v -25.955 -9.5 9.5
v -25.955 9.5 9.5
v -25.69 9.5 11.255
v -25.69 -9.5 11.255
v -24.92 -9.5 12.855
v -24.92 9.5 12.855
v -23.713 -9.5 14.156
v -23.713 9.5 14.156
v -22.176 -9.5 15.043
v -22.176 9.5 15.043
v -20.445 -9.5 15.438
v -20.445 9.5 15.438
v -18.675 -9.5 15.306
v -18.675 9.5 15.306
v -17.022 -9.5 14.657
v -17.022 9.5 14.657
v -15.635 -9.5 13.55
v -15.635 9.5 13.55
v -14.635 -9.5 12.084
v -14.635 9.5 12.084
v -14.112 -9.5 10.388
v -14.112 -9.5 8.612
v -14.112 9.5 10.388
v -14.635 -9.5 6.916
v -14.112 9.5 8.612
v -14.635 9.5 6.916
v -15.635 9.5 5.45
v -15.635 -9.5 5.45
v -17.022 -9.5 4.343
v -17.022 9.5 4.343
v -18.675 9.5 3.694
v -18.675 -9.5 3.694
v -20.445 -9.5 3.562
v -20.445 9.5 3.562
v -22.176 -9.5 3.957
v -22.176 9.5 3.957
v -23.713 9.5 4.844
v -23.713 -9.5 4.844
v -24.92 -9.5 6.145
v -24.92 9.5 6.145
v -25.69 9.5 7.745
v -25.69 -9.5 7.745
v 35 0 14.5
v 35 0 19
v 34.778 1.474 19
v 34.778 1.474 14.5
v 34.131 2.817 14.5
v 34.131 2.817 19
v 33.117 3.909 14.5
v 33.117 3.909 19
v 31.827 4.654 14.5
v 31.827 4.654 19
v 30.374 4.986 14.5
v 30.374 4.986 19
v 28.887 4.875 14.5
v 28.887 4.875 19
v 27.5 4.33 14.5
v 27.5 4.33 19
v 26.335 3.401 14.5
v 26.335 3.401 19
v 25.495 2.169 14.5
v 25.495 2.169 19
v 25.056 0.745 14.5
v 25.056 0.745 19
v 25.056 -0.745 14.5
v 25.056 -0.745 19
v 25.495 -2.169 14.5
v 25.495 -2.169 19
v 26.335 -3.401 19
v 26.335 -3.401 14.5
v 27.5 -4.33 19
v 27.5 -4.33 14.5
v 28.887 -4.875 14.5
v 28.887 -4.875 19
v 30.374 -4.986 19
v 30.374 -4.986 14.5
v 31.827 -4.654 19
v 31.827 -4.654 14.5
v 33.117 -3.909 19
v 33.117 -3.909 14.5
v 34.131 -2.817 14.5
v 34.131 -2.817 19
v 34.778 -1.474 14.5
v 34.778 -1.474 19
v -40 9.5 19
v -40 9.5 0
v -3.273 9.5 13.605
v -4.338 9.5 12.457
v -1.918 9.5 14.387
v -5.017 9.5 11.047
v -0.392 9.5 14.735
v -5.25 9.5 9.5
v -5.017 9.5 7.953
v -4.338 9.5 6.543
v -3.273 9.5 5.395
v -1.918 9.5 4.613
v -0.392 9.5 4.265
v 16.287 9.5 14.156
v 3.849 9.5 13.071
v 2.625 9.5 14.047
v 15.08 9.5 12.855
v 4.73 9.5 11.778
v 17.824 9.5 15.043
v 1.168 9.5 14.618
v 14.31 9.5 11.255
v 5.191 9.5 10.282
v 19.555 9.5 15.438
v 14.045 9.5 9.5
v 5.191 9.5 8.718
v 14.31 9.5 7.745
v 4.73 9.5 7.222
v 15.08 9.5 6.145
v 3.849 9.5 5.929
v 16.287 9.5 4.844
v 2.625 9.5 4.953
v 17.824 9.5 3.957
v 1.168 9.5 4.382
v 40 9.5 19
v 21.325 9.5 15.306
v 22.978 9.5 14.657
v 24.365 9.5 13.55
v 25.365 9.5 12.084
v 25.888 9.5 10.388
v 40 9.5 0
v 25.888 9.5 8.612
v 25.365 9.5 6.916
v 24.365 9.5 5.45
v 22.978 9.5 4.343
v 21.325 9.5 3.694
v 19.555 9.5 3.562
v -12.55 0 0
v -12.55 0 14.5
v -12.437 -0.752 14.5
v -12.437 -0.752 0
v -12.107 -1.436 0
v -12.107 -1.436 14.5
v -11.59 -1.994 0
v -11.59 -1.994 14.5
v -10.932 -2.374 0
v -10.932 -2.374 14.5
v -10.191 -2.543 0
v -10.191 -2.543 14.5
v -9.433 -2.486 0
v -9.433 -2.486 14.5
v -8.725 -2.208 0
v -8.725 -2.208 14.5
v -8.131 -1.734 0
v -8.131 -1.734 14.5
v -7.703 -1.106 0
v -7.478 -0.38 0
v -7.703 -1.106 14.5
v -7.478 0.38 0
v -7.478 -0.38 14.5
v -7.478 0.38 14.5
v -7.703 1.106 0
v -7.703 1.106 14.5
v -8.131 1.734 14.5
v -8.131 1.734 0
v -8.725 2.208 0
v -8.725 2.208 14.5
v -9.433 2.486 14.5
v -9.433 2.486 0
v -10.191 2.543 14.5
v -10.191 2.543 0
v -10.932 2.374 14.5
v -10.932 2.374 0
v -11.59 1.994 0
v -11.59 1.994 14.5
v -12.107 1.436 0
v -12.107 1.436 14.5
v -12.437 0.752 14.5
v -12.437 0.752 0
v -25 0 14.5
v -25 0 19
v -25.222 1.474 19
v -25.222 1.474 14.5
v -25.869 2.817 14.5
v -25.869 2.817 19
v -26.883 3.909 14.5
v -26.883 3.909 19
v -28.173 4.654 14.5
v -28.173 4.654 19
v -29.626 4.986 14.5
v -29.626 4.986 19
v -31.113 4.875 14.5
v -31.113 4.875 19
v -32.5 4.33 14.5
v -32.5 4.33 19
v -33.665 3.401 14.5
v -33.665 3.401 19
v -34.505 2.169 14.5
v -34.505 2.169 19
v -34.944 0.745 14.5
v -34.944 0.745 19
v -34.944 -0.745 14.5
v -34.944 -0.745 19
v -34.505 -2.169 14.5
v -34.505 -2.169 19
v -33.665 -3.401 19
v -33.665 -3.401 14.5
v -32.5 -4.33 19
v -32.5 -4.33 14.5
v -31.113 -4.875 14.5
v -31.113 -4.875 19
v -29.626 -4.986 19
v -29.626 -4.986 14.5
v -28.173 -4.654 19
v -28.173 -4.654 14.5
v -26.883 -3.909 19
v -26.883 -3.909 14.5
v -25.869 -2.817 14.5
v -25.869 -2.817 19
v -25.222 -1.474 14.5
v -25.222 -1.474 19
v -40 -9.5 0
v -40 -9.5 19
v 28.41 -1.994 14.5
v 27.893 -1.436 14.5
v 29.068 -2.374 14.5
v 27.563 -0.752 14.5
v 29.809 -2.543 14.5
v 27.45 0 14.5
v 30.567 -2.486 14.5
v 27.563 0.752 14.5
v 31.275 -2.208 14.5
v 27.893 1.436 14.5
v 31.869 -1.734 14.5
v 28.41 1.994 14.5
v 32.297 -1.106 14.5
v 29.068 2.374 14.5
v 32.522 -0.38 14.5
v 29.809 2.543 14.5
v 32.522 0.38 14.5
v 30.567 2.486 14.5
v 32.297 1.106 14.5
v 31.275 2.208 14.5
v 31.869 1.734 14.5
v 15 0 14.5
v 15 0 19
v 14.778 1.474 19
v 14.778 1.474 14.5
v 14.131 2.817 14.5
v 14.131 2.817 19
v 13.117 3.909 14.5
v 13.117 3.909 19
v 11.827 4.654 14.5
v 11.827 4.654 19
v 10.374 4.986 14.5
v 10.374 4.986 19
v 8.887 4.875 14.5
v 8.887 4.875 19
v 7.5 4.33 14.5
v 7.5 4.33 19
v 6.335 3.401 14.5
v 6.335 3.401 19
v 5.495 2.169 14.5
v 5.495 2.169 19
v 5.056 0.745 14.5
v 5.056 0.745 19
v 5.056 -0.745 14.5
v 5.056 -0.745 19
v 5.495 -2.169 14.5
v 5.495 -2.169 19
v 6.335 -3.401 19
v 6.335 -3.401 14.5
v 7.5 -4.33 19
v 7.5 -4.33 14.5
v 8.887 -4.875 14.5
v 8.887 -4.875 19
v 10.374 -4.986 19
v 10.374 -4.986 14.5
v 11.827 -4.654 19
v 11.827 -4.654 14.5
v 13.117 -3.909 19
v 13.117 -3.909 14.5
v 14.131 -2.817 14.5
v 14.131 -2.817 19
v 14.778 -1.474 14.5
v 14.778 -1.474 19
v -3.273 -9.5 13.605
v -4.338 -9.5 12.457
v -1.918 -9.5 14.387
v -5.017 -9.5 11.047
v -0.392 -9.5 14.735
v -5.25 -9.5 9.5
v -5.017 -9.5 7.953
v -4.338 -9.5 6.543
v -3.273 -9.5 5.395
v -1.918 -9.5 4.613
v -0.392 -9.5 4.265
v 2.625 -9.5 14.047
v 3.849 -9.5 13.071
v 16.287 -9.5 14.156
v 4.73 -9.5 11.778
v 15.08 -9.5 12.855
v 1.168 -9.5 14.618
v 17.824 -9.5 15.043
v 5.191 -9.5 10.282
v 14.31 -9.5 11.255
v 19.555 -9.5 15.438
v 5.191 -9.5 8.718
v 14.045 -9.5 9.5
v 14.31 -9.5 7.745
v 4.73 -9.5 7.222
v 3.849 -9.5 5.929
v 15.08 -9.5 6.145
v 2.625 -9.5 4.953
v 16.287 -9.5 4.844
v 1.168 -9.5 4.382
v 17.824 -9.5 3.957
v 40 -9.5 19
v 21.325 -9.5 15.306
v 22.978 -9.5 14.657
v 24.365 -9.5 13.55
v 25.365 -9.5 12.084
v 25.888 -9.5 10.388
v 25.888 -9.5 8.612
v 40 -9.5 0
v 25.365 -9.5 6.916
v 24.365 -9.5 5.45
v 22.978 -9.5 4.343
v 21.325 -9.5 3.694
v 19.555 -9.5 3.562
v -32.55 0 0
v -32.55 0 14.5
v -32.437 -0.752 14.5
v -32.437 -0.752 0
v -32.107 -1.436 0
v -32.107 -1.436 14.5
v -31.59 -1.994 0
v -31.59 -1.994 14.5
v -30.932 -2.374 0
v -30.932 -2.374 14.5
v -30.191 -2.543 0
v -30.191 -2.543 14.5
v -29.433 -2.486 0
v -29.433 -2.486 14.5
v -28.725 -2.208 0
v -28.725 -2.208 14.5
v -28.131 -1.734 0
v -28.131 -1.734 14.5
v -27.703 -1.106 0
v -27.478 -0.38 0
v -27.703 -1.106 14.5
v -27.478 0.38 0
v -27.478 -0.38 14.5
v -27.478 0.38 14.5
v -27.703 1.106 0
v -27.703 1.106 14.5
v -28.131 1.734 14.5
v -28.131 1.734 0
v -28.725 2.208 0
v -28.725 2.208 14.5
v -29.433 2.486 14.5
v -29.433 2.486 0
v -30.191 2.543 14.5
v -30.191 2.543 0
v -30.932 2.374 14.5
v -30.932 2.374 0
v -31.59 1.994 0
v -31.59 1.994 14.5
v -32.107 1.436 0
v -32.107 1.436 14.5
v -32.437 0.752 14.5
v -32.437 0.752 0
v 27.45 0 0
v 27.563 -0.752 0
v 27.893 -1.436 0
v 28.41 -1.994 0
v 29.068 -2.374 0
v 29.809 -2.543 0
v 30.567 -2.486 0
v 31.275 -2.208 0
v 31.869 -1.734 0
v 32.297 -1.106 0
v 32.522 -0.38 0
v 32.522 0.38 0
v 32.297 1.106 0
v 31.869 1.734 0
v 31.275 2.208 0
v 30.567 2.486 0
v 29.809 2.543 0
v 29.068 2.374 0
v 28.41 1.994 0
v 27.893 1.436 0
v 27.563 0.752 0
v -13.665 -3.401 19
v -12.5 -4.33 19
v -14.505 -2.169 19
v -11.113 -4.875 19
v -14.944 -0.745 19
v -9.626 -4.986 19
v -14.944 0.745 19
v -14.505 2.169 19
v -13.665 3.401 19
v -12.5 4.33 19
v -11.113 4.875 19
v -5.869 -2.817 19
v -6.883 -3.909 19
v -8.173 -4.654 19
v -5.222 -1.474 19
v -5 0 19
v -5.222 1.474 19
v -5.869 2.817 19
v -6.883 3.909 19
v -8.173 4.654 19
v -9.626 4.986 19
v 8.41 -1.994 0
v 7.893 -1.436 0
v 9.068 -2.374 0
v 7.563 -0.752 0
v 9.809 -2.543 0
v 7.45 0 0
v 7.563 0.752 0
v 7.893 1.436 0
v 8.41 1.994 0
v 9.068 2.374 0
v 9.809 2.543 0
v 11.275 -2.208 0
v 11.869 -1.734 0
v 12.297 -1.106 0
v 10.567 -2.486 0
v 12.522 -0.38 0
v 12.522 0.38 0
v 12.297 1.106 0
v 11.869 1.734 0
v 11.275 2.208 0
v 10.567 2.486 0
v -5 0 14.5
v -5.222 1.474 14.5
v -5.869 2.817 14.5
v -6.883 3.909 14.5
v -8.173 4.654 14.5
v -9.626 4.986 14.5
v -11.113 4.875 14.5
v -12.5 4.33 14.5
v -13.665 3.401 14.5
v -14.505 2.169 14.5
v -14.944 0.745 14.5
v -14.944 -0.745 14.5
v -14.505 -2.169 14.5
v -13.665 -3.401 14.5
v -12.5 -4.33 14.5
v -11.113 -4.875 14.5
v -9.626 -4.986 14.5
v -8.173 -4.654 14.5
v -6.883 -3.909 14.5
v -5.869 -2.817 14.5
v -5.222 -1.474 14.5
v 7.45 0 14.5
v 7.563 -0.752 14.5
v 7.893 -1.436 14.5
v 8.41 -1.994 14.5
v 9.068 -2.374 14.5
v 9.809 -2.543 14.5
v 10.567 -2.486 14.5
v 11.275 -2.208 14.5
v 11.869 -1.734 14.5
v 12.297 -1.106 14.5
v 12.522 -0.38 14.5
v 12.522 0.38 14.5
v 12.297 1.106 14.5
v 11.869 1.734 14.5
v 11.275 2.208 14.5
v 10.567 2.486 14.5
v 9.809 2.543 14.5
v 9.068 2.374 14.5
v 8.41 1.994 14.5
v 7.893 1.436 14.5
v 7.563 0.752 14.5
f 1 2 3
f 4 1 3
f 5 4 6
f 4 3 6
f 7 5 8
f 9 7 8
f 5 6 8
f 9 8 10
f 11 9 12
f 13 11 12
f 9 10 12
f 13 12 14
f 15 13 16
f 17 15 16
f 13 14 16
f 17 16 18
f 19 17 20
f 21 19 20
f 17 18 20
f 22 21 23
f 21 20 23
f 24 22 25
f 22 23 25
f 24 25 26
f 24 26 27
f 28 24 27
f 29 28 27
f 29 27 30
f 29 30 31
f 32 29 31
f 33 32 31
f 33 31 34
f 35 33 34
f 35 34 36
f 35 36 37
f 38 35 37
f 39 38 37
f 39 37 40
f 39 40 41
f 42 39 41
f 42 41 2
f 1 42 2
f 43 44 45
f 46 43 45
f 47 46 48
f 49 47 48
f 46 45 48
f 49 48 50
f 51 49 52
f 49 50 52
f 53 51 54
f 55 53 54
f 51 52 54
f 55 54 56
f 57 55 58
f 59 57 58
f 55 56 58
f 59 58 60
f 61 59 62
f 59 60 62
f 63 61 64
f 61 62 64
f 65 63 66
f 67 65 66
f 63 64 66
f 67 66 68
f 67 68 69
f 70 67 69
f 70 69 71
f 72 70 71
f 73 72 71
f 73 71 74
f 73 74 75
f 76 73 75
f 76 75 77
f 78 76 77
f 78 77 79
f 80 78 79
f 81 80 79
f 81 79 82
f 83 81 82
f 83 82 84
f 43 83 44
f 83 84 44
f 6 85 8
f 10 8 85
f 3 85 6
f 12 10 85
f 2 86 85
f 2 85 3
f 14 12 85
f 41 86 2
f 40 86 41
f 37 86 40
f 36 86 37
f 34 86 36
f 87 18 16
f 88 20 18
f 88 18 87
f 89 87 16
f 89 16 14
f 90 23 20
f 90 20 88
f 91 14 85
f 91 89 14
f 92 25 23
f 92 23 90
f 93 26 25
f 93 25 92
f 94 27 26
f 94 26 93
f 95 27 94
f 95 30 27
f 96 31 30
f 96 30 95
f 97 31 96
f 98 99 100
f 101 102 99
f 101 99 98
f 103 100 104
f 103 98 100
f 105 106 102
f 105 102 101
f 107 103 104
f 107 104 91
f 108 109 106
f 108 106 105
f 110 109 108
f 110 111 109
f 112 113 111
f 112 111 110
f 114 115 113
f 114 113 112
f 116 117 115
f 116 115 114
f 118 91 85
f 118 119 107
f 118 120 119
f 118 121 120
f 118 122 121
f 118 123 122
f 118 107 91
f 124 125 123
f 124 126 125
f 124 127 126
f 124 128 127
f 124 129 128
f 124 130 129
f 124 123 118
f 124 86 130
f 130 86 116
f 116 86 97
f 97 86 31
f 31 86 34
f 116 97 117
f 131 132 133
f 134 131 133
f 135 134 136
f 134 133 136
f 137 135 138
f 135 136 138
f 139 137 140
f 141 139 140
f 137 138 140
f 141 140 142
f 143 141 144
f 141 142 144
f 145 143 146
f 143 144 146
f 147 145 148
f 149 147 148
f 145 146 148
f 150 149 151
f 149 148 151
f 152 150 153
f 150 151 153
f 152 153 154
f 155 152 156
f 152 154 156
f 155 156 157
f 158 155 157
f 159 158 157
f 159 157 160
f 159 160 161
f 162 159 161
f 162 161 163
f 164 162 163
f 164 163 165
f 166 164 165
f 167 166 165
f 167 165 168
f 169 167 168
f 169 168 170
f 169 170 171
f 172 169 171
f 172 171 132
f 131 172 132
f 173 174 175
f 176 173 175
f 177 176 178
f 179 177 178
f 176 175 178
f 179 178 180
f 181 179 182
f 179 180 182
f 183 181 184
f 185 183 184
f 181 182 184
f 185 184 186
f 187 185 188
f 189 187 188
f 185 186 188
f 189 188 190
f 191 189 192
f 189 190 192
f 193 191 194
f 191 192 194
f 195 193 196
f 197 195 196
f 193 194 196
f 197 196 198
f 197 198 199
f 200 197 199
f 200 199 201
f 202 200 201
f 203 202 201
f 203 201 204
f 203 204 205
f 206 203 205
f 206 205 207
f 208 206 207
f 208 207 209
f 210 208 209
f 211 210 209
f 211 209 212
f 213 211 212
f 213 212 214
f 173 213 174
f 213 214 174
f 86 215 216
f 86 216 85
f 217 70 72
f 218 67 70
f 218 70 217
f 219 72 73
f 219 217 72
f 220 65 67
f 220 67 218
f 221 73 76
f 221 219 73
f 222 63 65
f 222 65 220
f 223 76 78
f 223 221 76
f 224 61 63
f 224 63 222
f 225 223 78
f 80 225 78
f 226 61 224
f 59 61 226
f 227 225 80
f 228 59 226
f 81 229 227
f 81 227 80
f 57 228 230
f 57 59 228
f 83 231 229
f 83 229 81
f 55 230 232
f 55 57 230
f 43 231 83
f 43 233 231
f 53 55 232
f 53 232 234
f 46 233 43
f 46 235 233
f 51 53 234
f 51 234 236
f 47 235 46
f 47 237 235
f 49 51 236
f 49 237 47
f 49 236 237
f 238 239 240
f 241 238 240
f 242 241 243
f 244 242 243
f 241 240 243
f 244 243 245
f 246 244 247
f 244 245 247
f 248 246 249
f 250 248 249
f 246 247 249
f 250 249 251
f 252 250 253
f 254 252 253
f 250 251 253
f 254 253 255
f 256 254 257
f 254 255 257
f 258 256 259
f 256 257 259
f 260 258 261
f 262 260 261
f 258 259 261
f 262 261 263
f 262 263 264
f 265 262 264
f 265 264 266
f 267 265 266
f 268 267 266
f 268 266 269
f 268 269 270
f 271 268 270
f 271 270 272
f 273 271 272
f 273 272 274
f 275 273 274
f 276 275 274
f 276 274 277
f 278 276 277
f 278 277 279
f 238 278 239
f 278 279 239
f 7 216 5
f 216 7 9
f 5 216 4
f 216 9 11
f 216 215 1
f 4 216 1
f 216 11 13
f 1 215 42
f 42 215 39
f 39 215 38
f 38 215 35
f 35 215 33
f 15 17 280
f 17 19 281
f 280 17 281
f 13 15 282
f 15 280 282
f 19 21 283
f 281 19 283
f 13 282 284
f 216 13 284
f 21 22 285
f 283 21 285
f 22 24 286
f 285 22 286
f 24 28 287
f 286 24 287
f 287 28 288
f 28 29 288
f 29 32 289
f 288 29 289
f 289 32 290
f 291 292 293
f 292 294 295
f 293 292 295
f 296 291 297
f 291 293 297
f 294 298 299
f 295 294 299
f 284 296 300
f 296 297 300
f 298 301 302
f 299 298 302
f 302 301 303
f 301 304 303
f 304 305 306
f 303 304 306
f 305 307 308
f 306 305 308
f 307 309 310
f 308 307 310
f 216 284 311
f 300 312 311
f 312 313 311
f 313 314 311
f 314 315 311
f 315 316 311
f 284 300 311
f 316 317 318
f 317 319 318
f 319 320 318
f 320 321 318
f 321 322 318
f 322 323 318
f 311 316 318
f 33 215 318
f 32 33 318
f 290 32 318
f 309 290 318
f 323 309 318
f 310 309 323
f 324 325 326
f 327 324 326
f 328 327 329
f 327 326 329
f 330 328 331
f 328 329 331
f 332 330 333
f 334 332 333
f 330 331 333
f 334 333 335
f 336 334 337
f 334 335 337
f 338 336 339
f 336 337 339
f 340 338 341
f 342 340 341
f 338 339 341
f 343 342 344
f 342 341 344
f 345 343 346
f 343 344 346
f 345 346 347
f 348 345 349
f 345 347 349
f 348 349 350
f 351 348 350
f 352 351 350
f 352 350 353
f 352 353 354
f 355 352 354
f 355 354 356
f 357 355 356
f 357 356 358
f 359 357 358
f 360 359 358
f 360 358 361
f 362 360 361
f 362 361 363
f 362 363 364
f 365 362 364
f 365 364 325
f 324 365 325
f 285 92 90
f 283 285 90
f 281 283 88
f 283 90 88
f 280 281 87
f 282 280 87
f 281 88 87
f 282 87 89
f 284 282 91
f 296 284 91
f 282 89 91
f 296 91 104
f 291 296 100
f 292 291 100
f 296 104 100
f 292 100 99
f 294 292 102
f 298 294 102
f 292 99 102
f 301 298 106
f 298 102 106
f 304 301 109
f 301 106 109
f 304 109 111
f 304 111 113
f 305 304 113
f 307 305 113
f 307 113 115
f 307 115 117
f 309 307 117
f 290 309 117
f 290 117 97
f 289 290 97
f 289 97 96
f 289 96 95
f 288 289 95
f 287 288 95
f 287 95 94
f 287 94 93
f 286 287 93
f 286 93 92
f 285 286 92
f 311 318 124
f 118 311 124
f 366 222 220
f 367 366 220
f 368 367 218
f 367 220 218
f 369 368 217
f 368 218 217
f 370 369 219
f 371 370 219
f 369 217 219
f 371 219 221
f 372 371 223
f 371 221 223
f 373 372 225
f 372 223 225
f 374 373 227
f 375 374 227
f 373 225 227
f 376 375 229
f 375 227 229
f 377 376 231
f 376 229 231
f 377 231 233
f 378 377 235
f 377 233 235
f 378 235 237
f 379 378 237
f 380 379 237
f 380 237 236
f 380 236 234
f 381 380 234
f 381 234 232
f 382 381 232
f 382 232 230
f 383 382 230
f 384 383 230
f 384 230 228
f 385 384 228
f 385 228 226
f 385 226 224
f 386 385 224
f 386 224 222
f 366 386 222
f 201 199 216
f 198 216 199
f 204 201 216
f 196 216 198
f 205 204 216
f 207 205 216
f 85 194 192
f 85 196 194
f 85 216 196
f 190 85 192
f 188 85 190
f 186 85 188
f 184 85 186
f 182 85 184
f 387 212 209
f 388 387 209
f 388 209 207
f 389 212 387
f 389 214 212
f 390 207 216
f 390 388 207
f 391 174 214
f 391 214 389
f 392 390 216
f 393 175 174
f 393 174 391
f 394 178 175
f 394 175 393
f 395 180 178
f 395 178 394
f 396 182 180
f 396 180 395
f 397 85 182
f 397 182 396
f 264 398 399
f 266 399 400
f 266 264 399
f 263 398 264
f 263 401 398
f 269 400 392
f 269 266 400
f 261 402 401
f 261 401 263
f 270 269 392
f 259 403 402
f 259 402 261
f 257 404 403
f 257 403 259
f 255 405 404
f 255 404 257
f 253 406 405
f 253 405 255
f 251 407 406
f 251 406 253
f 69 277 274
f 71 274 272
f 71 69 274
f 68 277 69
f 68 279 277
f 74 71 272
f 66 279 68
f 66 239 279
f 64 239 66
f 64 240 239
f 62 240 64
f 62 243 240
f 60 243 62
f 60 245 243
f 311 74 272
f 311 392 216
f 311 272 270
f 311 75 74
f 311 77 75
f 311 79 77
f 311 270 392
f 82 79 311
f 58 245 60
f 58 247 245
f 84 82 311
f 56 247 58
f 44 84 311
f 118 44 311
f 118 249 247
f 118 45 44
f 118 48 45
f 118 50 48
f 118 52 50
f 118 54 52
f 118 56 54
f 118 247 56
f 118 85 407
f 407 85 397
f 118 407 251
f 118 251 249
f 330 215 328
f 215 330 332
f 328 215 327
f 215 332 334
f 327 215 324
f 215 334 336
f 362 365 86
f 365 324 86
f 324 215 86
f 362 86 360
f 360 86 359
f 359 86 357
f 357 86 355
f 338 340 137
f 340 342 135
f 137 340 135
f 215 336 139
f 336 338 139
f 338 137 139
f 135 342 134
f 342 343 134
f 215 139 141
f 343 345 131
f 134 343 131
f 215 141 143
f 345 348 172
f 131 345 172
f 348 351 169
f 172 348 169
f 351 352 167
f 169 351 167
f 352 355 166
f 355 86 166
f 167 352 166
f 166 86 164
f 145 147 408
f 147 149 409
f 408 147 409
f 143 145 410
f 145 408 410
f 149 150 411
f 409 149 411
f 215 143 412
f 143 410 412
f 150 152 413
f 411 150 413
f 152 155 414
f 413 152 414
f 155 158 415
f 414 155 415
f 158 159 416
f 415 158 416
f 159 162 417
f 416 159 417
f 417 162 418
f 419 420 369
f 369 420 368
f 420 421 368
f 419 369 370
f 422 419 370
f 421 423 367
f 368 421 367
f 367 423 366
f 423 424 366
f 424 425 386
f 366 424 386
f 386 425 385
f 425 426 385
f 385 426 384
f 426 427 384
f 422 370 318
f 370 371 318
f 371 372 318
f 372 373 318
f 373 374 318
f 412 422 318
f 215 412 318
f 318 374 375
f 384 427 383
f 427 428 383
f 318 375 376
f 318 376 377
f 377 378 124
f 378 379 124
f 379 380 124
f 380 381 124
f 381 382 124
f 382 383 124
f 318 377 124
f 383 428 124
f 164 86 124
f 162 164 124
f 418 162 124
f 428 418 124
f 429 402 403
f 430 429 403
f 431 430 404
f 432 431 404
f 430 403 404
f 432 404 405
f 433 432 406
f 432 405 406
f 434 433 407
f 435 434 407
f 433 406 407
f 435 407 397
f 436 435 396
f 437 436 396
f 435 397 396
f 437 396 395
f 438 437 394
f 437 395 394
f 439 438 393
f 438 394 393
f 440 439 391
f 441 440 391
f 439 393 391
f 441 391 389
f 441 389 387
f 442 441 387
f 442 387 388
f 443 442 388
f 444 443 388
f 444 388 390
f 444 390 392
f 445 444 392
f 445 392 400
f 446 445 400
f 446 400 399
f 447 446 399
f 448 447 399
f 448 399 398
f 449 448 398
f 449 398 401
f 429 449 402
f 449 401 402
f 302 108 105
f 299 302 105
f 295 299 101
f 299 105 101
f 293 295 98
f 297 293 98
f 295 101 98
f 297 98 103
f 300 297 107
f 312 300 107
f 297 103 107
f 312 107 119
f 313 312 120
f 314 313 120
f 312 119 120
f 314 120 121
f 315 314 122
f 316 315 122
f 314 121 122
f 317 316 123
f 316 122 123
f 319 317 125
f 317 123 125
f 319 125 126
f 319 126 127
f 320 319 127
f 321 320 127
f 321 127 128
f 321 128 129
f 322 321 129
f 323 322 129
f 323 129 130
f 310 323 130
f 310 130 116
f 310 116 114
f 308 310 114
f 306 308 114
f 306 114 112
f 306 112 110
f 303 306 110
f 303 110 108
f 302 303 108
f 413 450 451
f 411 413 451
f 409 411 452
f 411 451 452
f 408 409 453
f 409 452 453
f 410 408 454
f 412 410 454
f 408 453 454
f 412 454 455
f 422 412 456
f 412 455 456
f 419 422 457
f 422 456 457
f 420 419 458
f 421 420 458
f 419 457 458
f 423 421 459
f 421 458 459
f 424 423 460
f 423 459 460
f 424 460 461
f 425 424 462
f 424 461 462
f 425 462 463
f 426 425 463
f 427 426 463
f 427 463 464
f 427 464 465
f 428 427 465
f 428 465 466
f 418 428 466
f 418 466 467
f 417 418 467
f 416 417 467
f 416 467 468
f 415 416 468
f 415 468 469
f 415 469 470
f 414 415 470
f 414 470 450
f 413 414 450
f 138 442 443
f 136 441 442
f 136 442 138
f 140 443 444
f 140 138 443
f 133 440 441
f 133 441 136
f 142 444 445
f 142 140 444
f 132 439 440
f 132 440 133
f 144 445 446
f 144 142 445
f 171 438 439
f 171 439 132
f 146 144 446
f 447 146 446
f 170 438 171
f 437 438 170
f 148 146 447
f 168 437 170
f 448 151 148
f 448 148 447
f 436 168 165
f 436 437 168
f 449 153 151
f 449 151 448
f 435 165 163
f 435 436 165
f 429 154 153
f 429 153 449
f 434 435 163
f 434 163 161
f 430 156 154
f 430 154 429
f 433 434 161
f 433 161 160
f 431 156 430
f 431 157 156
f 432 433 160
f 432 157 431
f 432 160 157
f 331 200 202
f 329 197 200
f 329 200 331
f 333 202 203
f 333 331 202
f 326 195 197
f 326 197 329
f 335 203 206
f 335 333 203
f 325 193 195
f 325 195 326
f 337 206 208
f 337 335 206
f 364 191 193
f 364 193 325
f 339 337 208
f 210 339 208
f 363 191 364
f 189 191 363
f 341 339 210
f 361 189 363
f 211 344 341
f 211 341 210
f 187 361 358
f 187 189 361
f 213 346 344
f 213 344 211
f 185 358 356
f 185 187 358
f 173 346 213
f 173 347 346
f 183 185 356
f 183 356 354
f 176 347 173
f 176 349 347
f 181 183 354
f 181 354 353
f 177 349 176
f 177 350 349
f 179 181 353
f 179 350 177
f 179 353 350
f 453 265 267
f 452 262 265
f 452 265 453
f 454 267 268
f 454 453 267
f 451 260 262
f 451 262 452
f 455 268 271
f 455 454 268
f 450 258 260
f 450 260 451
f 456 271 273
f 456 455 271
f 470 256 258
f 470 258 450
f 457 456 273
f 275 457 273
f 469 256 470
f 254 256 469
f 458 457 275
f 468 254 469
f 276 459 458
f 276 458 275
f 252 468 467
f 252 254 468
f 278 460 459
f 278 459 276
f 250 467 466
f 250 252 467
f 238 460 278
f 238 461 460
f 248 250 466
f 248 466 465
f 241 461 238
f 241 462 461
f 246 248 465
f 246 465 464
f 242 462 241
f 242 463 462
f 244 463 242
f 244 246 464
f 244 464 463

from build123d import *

# Parameters (mm, degrees)
F0_W     = 80
F0_H     = 19
F1_DEPTH = 19
F2_R     = 5.955
F2_R_2   = 5.25
F3_DEPTH = 19.001
F5_DEPTH = 19.001
F6_R     = 5
F7_DEPTH = 4.5


with BuildPart() as f1:
    # F0 (on Top) → F1 (new body)
    with BuildSketch(Plane.XY):
        Rectangle(F0_W, F0_H)
    extrude(amount=F1_DEPTH)

    # F2 (on face) → F3 (cut, through all)
    with BuildSketch(Plane(origin=(0, 9.5, 0), x_dir=(-1, 0, 0), z_dir=(0, 1, 0))):
        with Locations((20, 9.5)):
            Circle(F2_R)
        with Locations((-20, 9.5)):
            Circle(F2_R)
        with Locations((0, 9.5)):
            Circle(F2_R_2)
    extrude(amount=-F3_DEPTH, mode=Mode.SUBTRACT)

    # F4 (on face) → F5 (cut, through all)
    with BuildSketch(Plane.XY.offset(19)):
        with BuildLine():
            ThreePointArc((-27.45, 0), (-30, 2.55), (-32.55, 0))
            Line((-32.55, 0), (-27.45, 0))
        make_face()
        with BuildLine():
            ThreePointArc((32.55, 0), (30, 2.55), (27.45, 0))
            Line((27.45, 0), (32.55, 0))
        make_face()
        with BuildLine():
            Line((32.55, 0), (27.45, 0))
            ThreePointArc((27.45, 0), (30, -2.55), (32.55, 0))
        make_face()
        with BuildLine():
            ThreePointArc((12.55, 0), (10, 2.55), (7.45, 0))
            Line((7.45, 0), (12.55, 0))
        make_face()
        with BuildLine():
            Line((12.55, 0), (7.45, 0))
            ThreePointArc((7.45, 0), (10, -2.55), (12.55, 0))
        make_face()
        with BuildLine():
            ThreePointArc((-7.45, 0), (-10, 2.55), (-12.55, 0))
            Line((-12.55, 0), (-7.45, 0))
        make_face()
        with BuildLine():
            Line((-7.45, 0), (-12.55, 0))
            ThreePointArc((-12.55, 0), (-10, -2.55), (-7.45, 0))
        make_face()
        with BuildLine():
            Line((-27.45, 0), (-32.55, 0))
            ThreePointArc((-32.55, 0), (-30, -2.55), (-27.45, 0))
        make_face()
    extrude(amount=-F5_DEPTH, mode=Mode.SUBTRACT)

    # F6 (on face) → F7 (cut)
    with BuildSketch(Plane.XY.offset(19)):
        with Locations((-30, 0)):
            Circle(F6_R)
        with Locations((-10, 0)):
            Circle(F6_R)
        with Locations((10, 0)):
            Circle(F6_R)
        with Locations((30, 0)):
            Circle(F6_R)
    extrude(amount=-F7_DEPTH, mode=Mode.SUBTRACT)


solid = f1.part
